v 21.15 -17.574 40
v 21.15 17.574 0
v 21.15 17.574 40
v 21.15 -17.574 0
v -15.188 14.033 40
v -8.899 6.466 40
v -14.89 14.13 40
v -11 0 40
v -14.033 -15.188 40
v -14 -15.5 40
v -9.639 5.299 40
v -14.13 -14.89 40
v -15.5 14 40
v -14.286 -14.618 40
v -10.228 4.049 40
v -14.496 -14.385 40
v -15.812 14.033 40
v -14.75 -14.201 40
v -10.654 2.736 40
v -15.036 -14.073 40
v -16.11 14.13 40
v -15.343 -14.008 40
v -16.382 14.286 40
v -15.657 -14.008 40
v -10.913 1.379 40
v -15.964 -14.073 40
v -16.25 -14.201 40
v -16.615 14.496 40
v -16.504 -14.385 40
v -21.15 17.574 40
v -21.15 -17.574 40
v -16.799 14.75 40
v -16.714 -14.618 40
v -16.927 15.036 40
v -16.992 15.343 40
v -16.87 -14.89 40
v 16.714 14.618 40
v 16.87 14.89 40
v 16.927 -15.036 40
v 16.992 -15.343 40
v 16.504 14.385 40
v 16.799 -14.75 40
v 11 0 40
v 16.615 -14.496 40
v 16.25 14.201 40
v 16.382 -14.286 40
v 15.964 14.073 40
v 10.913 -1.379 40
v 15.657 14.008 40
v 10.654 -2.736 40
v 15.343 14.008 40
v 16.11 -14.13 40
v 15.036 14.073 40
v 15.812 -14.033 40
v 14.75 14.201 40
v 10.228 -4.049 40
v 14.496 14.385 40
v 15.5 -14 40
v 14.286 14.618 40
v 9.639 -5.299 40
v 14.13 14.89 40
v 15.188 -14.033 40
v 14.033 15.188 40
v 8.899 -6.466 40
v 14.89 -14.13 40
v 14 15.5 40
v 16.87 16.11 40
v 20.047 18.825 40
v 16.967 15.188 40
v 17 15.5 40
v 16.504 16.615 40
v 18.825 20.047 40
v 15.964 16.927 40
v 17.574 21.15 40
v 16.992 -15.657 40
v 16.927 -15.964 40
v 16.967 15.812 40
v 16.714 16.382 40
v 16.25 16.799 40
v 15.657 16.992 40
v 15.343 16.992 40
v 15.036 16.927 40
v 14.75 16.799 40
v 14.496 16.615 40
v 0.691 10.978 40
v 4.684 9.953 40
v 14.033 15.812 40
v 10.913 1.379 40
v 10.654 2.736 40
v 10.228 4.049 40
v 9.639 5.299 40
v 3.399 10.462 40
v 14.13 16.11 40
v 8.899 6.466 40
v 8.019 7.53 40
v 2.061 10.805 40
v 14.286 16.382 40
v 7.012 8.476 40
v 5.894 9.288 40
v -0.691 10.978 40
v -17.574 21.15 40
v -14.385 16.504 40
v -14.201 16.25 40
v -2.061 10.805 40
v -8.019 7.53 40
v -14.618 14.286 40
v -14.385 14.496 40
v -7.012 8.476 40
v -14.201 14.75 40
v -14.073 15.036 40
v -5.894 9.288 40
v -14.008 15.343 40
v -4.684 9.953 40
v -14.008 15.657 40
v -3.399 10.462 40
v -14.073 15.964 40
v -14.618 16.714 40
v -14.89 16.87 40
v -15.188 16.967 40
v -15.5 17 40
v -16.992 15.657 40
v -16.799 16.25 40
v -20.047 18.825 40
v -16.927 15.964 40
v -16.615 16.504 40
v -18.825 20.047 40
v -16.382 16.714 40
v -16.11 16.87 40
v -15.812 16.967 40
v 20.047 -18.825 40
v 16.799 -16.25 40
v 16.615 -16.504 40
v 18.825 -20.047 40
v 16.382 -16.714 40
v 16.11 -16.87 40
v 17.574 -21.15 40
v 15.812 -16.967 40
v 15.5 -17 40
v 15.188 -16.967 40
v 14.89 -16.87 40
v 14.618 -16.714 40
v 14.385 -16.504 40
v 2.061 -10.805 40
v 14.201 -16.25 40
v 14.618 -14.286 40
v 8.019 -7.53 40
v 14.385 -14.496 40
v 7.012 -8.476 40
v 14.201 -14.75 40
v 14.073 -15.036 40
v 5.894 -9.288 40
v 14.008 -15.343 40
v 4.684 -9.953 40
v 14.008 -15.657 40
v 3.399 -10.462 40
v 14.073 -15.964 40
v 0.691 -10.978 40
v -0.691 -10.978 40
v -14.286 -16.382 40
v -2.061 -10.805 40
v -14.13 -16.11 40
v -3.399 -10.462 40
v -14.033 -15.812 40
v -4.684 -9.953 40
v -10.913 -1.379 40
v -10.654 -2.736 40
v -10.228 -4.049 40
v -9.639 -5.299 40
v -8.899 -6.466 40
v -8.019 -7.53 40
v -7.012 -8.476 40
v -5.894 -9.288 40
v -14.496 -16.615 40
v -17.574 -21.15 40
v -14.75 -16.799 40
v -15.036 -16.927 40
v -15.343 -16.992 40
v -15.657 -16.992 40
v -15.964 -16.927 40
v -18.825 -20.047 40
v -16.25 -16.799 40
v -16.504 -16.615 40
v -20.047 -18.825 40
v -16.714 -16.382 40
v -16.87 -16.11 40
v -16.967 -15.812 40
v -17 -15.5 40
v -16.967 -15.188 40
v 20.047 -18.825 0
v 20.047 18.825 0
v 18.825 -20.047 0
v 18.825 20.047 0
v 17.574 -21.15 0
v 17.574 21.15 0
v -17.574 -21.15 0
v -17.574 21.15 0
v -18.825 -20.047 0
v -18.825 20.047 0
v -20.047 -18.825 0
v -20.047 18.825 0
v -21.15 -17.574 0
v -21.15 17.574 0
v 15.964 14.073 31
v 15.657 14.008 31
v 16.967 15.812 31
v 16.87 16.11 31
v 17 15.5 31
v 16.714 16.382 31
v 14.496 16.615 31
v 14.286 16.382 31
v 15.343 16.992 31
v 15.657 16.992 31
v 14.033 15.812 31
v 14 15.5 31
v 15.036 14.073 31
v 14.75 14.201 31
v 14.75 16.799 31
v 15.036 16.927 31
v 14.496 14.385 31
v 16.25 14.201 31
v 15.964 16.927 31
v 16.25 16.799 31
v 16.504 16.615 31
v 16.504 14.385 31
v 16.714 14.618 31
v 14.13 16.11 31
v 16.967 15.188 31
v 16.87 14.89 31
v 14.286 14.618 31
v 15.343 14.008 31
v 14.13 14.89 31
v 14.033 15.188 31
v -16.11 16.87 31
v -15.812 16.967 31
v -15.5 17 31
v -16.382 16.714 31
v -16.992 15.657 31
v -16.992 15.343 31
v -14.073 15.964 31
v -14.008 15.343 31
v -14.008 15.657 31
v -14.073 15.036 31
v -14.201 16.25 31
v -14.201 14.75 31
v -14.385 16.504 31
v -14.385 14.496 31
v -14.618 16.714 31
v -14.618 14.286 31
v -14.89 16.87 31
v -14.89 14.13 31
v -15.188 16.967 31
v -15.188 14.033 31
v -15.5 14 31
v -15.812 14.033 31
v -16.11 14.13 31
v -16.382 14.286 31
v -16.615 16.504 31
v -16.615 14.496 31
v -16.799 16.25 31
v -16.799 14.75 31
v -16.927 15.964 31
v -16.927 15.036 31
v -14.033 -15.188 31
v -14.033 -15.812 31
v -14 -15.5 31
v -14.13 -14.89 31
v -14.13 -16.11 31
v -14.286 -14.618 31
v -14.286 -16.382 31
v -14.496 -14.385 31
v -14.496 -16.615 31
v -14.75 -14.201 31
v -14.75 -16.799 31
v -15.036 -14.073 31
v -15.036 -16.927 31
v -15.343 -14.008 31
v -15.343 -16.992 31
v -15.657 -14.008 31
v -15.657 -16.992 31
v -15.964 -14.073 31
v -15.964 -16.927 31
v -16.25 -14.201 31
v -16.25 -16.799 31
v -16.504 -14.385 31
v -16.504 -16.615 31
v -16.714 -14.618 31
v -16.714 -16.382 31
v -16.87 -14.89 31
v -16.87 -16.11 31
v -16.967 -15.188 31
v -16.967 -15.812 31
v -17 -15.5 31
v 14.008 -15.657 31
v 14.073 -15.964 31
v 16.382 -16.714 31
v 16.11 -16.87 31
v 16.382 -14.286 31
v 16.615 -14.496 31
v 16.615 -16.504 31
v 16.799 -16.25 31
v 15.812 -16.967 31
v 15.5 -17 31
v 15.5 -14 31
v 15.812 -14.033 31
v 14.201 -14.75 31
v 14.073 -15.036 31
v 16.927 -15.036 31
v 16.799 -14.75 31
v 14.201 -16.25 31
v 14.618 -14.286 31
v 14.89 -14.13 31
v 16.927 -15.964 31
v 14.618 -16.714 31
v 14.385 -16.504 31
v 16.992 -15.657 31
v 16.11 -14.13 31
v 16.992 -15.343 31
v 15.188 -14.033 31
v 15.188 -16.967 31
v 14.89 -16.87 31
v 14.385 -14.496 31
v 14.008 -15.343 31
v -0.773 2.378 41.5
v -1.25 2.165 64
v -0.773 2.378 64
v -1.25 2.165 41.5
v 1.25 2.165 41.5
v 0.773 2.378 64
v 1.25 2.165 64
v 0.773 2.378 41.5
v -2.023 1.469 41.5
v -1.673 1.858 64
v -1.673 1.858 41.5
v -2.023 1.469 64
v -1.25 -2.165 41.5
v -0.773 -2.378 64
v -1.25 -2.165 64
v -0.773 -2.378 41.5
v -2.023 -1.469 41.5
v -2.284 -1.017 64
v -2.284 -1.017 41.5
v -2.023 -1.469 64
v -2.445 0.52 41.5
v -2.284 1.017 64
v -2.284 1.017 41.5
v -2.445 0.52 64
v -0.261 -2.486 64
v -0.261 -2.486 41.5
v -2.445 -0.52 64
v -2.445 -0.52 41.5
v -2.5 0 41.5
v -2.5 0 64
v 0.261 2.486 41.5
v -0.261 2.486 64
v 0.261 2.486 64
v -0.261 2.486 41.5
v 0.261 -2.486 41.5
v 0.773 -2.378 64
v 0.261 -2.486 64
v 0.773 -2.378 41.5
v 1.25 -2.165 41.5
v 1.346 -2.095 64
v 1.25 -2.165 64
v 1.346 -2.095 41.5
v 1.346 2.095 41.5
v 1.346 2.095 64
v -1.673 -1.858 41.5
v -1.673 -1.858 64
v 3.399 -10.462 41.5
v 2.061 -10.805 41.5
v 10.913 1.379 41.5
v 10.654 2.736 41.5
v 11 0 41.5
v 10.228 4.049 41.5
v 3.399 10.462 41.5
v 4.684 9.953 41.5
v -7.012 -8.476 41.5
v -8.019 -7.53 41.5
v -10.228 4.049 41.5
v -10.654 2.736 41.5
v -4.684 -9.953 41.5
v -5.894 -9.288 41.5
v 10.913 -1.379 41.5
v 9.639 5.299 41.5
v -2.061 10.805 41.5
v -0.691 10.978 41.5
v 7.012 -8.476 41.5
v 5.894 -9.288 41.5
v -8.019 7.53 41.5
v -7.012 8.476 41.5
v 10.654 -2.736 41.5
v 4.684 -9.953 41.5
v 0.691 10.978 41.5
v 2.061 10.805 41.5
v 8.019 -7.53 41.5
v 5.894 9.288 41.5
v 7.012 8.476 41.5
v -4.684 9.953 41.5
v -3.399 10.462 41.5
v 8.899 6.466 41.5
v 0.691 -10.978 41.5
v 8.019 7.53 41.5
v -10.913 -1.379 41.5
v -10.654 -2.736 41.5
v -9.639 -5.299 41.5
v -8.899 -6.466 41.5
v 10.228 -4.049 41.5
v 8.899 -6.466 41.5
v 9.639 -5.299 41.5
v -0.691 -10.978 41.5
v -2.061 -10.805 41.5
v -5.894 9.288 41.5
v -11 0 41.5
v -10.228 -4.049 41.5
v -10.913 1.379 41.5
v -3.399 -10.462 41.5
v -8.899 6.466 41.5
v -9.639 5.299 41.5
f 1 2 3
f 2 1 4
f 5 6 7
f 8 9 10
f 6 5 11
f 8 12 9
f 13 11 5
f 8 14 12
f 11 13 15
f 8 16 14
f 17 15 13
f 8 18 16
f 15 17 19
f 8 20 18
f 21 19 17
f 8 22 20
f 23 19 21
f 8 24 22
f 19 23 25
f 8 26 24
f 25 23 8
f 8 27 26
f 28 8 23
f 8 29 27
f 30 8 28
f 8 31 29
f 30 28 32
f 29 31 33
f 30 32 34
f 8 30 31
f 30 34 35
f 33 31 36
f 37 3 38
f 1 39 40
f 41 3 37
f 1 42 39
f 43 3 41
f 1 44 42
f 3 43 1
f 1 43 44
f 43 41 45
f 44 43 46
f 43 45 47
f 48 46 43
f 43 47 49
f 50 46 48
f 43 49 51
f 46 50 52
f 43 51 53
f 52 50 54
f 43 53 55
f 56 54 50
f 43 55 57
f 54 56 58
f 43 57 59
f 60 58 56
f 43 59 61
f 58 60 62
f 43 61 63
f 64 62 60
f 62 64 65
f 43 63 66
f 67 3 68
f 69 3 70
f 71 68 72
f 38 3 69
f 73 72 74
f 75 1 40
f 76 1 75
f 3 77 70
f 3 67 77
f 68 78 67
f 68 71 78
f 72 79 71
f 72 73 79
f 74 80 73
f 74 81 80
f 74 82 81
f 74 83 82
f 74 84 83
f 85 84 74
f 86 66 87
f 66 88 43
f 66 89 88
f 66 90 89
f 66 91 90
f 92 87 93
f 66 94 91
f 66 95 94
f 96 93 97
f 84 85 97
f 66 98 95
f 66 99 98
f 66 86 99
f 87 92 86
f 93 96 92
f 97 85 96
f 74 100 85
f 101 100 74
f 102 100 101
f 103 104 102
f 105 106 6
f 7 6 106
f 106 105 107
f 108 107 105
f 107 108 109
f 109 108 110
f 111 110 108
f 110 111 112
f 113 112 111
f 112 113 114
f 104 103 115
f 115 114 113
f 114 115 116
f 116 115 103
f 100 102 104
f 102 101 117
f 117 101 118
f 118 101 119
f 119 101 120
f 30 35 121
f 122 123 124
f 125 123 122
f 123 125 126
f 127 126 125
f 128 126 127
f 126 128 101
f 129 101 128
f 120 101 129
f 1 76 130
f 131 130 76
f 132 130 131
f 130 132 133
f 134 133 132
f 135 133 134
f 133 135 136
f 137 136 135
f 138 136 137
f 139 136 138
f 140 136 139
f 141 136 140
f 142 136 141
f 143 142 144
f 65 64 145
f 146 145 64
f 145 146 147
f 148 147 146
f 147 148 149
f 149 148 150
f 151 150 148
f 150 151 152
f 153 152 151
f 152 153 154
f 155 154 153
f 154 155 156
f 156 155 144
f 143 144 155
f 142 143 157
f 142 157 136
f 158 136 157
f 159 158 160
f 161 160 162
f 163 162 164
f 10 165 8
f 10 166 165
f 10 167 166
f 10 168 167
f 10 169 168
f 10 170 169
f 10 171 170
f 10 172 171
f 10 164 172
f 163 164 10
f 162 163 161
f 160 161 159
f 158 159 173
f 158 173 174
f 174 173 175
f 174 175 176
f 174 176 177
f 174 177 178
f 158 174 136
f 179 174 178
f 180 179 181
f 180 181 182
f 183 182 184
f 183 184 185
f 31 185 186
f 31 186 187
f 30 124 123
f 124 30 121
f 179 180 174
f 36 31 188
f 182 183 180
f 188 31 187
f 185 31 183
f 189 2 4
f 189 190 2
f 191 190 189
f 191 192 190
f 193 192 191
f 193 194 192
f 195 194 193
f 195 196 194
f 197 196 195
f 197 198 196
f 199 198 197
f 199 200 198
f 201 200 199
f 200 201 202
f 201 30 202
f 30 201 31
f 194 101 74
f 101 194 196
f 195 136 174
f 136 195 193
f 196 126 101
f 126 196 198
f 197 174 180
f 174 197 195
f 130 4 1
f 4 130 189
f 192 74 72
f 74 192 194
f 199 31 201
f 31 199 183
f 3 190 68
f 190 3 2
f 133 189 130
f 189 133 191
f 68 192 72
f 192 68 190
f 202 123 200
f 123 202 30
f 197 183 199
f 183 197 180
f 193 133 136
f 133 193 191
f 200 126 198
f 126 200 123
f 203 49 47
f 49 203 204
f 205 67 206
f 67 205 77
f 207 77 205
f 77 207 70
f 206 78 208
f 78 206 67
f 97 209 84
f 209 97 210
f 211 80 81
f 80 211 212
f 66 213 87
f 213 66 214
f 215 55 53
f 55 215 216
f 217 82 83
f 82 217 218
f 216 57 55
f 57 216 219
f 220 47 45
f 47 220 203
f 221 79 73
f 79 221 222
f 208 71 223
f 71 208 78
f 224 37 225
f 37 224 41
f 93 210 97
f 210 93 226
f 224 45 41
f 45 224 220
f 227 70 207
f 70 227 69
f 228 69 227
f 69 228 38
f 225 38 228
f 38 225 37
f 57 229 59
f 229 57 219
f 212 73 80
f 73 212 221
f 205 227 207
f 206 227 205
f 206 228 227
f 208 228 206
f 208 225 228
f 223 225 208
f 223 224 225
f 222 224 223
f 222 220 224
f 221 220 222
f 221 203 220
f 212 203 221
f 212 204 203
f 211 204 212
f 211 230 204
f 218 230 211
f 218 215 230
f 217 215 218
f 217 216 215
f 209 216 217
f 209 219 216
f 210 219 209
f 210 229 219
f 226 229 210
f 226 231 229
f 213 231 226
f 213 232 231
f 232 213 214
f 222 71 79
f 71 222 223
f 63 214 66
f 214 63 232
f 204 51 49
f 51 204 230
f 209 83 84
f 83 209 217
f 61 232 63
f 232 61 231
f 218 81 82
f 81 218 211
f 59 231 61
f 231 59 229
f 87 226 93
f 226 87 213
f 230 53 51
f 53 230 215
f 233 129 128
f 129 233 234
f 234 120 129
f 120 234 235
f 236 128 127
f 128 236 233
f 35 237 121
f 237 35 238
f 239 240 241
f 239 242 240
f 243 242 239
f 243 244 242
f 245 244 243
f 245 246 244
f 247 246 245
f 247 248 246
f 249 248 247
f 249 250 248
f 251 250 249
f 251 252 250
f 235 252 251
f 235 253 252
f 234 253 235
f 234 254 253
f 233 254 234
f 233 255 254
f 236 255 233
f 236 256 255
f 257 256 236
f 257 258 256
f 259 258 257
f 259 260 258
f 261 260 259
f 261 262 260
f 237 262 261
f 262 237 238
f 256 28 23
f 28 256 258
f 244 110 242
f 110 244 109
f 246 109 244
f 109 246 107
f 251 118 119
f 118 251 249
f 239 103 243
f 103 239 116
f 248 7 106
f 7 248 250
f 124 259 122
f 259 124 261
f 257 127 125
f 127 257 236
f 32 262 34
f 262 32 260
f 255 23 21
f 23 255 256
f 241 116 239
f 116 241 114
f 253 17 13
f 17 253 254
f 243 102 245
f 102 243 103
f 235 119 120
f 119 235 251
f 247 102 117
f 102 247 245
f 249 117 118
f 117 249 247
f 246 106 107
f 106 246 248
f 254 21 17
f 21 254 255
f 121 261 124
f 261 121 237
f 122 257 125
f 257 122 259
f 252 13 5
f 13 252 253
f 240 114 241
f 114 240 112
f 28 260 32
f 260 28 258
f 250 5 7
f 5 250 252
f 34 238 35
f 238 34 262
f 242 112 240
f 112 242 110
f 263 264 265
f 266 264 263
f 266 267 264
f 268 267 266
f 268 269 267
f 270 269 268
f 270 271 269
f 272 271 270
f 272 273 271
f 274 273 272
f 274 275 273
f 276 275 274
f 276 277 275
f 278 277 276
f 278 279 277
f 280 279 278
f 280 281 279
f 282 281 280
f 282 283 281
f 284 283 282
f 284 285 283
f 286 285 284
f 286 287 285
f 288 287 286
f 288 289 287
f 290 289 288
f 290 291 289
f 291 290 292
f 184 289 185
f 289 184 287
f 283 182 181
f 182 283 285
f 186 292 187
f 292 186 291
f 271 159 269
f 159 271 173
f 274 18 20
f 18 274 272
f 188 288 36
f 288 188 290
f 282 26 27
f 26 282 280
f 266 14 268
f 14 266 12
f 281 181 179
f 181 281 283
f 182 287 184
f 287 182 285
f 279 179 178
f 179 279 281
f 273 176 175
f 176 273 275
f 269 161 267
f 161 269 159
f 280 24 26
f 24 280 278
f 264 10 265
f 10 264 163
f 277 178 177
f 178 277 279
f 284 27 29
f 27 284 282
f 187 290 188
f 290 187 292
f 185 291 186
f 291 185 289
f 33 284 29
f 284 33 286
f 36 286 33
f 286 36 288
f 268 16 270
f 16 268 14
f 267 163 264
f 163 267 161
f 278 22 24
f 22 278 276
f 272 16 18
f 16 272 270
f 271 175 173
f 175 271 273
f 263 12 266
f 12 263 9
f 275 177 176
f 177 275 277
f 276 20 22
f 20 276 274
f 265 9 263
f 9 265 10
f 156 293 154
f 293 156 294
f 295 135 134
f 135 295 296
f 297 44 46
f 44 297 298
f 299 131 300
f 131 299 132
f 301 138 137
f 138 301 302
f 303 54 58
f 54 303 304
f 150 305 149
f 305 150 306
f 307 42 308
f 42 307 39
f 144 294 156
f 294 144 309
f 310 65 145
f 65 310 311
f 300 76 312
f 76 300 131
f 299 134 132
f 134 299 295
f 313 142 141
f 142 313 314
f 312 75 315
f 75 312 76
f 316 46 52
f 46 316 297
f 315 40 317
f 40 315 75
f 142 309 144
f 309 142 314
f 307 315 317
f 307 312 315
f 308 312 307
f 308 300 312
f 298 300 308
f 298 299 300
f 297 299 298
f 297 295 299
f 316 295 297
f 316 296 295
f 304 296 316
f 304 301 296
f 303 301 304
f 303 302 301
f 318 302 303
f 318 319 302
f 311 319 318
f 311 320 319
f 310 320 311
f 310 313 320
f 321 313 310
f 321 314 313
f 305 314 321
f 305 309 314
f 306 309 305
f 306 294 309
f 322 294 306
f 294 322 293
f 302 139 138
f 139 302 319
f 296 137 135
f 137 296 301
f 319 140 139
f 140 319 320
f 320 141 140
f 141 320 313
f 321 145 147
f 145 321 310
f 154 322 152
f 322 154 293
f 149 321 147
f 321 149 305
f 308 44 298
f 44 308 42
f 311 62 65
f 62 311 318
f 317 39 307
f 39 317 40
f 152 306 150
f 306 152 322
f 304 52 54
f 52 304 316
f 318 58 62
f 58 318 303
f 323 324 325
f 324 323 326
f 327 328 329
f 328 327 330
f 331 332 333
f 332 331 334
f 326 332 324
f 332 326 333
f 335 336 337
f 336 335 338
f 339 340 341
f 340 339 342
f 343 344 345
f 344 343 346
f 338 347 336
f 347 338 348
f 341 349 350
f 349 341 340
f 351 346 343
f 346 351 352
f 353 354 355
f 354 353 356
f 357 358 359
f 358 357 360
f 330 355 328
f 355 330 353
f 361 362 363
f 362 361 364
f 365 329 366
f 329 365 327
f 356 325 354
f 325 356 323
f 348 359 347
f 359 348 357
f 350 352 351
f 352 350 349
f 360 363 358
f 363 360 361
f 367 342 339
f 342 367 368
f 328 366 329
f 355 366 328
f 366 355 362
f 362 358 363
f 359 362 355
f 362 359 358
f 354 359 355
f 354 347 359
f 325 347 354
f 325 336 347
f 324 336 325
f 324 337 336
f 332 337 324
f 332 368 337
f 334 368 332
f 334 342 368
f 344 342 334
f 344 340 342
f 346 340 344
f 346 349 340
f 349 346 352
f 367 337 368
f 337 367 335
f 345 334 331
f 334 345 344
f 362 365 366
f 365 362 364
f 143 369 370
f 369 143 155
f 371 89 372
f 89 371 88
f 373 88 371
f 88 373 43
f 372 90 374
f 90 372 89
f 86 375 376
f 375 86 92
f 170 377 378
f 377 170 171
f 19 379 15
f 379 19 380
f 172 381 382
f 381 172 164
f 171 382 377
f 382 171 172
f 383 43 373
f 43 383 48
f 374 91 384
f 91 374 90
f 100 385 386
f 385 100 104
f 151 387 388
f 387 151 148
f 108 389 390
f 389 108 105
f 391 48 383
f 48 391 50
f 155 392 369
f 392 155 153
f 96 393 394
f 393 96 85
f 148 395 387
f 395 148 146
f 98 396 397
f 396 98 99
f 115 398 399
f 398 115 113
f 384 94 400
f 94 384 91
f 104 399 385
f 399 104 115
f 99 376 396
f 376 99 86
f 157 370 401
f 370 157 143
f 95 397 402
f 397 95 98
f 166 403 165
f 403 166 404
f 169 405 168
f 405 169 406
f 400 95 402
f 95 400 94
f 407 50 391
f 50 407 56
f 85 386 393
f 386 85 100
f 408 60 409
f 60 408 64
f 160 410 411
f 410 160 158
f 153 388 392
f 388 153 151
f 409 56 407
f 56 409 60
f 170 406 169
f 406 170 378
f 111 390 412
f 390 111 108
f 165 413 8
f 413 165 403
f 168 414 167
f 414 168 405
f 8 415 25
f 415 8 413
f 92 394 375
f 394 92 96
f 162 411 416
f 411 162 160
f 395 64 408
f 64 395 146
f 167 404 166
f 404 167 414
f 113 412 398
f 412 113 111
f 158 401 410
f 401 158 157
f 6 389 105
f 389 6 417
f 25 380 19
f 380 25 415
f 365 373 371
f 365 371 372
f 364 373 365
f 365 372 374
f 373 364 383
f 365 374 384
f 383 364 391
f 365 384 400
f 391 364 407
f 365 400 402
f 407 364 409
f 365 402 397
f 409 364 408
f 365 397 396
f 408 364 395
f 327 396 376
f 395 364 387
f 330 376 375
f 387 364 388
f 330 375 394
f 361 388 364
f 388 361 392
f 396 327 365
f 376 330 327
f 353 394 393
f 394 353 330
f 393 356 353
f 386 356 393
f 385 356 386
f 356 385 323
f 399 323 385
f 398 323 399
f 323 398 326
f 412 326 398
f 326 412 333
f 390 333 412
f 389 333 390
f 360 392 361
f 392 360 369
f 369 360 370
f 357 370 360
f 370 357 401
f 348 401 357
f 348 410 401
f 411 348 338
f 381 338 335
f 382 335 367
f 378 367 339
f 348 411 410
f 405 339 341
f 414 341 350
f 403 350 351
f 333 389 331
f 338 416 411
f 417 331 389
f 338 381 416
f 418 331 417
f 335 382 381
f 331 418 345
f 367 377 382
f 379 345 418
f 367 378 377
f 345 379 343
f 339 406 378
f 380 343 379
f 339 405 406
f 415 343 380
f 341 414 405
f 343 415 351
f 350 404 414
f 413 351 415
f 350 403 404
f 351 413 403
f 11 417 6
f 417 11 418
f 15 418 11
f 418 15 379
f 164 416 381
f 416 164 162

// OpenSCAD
module alu_2020(length) {
    translate([0, 0, length/2]) {
        cube([20, 20, length],center=true);
    }
}

module alu_2040(length) {
    color("gray") {
        translate([0, 0, length/2]) {
            cube([20, 40, length], center=true);
        }
    }
}


module frame() {
    translate([-496/2, 496/2+10, 20]) {
        rotate([90, 0, 90]) {
            alu_2040(496);
        }
    }
    
    translate([-496/2, -496/2-10, 20]) {
        rotate([90, 0, 90]) {
            alu_2040(496);
        }
    }
  
    translate([-496/2-20, -496/2, 10]) {
        rotate([0, 90, 90]) {
            alu_2040(496);
        }
    }
    
    translate([496/2+20, -496/2, 10]) {
        rotate([0, 90, 90]) {
            alu_2040(496);
        }
    }
    
    translate([-496/2-20, 496/2+10, 0]) {
        rotate([0, 0, 90]) {
            alu_2040(560);
        }
    }
    
    translate([-496/2-20, -496/2-10, 0]) {
        rotate([0, 0, 90]) {
            alu_2040(560);
        }
    }
    
    translate([496/2+20, 496/2+10, 0]) {
        rotate([0, 0, 90]) {
            alu_2040(560);
        }
    }
    
    translate([496/2+20, -496/2-10, 0]) {
        rotate([0, 0, 90]) {
            alu_2040(560);
        }
    }
    
    translate([496/2+20, 0, 20]) {
        rotate([0, 0, 90]) {
            alu_2040(442);
        }
    }
    
    translate([-496/2-20, 0, 20]) {
        rotate([0, 0, 90]) {
            alu_2040(442);
        }
    }
    
    translate([-496/2-20, -496/2, 442+30]) {
        rotate([0, 90, 90]) {
            alu_2040(496);
        }
    }
    
    translate([496/2+20, -496/2, 442+30]) {
        rotate([0, 90, 90]) {
            alu_2040(496);
        }
    }
    
    translate([-496/2-20, -496/2, 560-10]) {
        rotate([0, 90, 90]) {
            alu_2040(496);
        }
    }
    
    translate([496/2+20, -496/2, 560-10]) {
        rotate([0, 90, 90]) {
            alu_2040(496);
        }
    }
    
    translate([-496/2, -496/2-10, 560-20]) {
        rotate([90, 0, 90]) {
            alu_2040(496);
        }
    }
}  


module nema17(height) {
    difference() {
        intersection() {
            translate([0, 0, height/2]) {
                cube([42.3, 42.3, height], center=true);
            }
            
            cylinder(d=55, h=height, $fn=100);
        }
        
        for(i=[0:1:4]) {
            rotate([0, 0, 360/4*i]) {
                translate([31/2, 31/2, height-9]) {
                    cylinder(d=3, h=10, $fn=30);
                }
            }
        }
    }
    
    translate([0, 0, height]) {
        cylinder(d=22, h=1.5, $fn=50);
    }
    
    difference() {
        cylinder(d=5, h=height+24, $fn=30);
        
        translate([5/1.3, 0, (height+24)/2]) {
            cube([5,5,height+24], center=true);
        }
    }
}


//frame();
nema17(40);
